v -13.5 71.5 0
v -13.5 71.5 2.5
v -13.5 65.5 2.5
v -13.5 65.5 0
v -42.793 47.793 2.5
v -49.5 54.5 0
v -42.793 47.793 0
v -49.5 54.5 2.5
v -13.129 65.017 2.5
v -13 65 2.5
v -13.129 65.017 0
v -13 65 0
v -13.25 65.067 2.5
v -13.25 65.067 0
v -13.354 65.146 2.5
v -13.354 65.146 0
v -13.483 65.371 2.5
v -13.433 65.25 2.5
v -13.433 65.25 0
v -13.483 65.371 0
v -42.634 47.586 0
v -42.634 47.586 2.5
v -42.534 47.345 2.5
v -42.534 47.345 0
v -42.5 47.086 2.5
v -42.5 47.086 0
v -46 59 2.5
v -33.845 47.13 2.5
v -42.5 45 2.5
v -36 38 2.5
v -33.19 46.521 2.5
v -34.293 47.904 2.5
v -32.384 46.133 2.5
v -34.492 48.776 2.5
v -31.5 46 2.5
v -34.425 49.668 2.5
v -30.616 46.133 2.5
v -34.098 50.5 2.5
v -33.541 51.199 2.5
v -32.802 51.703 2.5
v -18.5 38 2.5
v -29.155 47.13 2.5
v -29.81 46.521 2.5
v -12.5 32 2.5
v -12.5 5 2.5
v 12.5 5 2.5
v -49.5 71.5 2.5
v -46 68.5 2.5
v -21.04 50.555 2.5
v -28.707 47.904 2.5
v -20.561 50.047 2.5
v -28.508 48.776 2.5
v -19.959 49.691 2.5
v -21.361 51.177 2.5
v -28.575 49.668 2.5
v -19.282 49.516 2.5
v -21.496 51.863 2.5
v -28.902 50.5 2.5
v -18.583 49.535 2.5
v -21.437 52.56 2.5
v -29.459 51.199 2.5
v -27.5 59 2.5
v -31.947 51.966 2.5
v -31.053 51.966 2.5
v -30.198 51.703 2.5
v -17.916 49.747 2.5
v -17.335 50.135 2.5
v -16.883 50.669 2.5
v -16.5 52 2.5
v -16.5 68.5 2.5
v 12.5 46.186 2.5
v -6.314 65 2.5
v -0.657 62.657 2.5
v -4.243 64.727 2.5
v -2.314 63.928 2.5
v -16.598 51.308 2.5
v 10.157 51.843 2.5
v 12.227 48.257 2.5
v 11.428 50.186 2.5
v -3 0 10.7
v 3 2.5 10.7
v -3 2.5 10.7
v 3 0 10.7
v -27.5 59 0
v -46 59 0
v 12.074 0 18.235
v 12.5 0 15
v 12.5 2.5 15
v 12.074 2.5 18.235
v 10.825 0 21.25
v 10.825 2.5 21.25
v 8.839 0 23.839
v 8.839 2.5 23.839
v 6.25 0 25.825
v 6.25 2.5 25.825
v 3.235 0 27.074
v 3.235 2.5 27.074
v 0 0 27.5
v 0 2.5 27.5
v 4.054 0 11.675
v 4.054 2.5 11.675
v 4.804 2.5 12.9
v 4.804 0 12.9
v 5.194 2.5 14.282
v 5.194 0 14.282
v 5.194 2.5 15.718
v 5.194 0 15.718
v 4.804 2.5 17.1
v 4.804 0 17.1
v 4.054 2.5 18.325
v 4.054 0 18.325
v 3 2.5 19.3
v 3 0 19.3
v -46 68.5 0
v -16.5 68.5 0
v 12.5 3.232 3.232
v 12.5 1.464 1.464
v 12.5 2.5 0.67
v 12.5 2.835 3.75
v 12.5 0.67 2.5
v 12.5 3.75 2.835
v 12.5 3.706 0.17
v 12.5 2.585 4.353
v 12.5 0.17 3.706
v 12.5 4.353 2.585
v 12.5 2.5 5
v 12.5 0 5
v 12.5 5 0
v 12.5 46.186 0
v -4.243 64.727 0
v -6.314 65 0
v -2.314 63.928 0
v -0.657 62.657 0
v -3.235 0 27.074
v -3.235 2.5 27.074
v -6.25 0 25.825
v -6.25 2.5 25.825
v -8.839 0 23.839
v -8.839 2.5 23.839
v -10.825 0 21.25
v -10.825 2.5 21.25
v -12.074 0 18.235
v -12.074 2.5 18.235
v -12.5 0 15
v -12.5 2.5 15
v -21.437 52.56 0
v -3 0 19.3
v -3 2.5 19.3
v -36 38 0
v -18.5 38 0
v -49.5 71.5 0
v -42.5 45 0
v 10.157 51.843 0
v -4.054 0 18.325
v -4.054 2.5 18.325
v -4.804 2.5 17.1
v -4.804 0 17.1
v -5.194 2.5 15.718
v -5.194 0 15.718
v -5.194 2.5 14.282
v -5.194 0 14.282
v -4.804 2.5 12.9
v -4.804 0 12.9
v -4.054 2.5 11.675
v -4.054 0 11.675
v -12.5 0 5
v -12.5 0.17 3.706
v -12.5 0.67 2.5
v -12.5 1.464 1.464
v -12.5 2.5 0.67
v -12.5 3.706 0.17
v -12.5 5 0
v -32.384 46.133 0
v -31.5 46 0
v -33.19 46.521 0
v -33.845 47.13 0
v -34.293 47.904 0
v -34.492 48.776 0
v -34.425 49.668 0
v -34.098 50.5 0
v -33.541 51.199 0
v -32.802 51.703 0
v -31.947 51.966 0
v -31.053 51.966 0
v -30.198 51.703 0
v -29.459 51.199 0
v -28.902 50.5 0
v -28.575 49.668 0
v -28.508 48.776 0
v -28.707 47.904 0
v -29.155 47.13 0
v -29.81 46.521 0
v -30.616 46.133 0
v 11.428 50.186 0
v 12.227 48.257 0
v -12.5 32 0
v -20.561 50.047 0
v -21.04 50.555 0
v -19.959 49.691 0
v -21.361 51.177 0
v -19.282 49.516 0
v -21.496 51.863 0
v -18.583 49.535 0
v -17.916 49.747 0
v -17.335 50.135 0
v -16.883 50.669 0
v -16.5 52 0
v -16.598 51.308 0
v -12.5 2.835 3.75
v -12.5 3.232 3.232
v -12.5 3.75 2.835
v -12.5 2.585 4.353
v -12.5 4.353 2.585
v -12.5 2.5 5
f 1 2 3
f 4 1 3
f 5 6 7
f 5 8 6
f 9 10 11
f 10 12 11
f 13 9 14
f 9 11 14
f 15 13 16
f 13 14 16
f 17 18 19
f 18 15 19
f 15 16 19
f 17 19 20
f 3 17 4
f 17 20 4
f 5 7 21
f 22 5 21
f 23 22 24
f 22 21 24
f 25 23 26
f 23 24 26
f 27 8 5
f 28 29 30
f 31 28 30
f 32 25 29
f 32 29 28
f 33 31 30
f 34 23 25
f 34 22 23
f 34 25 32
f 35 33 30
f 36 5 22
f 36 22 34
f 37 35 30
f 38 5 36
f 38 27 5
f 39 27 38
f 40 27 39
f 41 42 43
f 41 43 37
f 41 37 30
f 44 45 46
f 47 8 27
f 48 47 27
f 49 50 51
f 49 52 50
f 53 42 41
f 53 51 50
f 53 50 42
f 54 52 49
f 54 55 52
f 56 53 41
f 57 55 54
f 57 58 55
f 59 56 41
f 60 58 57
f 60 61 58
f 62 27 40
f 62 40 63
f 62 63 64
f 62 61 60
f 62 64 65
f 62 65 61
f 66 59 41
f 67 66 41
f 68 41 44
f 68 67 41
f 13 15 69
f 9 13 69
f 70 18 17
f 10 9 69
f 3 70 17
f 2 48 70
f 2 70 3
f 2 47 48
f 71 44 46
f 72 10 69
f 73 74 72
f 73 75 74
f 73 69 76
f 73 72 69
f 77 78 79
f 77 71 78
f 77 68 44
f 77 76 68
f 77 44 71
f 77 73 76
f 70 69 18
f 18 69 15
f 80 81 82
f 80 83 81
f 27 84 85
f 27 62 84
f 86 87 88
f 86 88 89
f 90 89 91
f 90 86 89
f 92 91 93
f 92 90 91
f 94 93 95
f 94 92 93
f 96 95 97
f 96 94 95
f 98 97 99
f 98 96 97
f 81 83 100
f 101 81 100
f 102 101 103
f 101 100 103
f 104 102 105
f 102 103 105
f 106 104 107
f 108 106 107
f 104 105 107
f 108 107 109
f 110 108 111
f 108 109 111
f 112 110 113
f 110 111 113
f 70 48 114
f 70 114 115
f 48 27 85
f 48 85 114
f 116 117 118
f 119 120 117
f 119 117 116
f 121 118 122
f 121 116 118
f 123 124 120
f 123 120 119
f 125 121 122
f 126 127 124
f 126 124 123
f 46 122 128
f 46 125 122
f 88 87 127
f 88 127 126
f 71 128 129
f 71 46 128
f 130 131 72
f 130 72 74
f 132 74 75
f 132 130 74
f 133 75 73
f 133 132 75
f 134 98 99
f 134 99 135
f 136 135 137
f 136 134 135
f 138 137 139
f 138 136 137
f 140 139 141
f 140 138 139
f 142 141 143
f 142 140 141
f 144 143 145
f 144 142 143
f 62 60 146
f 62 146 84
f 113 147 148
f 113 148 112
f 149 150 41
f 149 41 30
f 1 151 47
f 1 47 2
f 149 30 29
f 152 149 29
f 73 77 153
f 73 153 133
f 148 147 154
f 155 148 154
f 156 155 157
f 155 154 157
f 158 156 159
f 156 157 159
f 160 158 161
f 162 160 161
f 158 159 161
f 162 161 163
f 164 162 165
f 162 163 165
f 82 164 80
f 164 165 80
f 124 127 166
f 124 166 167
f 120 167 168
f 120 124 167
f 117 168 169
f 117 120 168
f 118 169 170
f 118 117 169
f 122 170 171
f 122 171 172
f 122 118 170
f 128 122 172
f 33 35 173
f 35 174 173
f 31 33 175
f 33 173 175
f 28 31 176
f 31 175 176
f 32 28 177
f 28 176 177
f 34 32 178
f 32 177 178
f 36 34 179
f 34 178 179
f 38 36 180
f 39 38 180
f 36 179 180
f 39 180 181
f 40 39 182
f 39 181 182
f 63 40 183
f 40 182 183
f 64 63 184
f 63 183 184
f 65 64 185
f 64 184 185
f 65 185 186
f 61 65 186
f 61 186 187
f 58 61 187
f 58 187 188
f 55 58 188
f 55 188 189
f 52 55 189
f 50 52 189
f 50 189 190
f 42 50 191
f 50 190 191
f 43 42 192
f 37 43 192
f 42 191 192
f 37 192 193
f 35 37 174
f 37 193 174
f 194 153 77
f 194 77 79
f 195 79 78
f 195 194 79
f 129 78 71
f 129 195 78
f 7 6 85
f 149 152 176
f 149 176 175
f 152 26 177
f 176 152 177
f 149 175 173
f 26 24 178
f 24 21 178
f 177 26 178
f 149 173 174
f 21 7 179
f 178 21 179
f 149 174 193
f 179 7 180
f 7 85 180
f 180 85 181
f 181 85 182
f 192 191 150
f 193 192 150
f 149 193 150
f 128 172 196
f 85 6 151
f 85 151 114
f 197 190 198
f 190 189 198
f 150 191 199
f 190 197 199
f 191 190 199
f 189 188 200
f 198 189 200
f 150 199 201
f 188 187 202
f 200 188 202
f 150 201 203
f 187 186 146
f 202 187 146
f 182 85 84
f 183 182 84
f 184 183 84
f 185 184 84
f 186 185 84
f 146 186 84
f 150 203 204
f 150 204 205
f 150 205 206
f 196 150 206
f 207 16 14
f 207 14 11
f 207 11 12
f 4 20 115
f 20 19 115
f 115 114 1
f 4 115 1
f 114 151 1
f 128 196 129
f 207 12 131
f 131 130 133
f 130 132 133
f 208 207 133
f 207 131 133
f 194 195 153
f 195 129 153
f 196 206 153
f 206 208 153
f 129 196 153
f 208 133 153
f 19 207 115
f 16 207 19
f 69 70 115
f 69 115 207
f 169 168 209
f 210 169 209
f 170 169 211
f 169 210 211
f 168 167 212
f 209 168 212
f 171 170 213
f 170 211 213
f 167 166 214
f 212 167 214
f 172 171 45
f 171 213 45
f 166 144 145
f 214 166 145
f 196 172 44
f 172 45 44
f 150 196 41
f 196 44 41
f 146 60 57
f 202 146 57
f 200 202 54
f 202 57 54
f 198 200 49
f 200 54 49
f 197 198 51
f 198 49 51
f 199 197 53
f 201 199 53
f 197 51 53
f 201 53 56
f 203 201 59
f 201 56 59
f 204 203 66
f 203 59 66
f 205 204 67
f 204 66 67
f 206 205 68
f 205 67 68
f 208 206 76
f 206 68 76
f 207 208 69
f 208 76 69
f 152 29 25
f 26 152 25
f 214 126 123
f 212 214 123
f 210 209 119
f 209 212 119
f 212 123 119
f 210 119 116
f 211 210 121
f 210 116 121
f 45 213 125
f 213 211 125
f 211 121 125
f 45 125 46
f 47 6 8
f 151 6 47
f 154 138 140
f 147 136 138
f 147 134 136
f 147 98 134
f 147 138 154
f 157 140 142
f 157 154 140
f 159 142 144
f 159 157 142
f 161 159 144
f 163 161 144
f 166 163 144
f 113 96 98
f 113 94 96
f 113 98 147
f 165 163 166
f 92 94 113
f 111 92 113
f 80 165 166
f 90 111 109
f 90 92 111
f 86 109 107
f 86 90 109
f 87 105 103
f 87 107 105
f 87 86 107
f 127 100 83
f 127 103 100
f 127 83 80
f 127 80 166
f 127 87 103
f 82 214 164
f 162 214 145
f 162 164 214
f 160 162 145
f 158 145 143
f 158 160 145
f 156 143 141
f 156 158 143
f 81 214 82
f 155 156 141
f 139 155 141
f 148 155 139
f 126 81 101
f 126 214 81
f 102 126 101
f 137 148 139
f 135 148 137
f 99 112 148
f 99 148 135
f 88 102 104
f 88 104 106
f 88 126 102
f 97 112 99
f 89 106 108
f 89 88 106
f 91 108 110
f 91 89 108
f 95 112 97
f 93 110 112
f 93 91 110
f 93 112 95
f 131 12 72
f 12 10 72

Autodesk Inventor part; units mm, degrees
ref_plane "YZ Plane" through (0, 0, 0) normal (1, 0, 0) x (0, 1, 0)
ref_plane "XZ Plane" through (0, 0, 0) normal (0, 1, 0) x (-1, 0, 0)
ref_plane "XY Plane" through (0, 0, 0) normal (0, 0, 1) x (1, 0, 0)
sketch "Sketch1" plane through (0, 0, 0) normal (0, 0, 1) x (1, 0, 0)
  line L0 (-12.5, 71.5) -> (12.5, 71.5)
  line L1 (12.5, 71.5) -> (12.5, 0)
  line L2 (12.5, 0) -> (-12.5, 0)
  line L3 (-12.5, 0) -> (-12.5, 71.5)
  line L4 (-49.5, 71.5) -> (12.5, 71.5)
  line L5 (12.5, 71.5) -> (12.5, 38)
  line L6 (12.5, 38) -> (-49.5, 38)
  line L7 (-49.5, 38) -> (-49.5, 71.5)
  point P0 (0, 0)
  point P1 (0, 0)
  dimension "d0" = 25
  dimension "d1" = 71.5
  dimension "d2" = 62
  dimension "d3" = 33.5
extrude "Plate1" add sketch "Sketch1" along normal blind 2.5
sketch "Sketch2" plane through (12.5, 2.5, 0) normal (0, -1, 0) x (1, 0, 0)
  line L0 (-25, 0) -> (0, 0)
  line L1 (0, 0) -> (0, 27.5)
  line L2 (0, 27.5) -> (-25, 27.5)
  line L3 (-25, 27.5) -> (-25, 0)
edge flange "Flange1" height 27.5 angle 90 thickness 2.5 bend radius 2.5 thickness toward (0, -1, 0) relief tear relief width 2.5 relief depth 1.25 edges at (0, 0, 2.5) wall of the first edge with corners at (-12.5, 2.5, 0) (12.5, 2.5, 0) (12.5, 2.5, 27.5) (-12.5, 2.5, 27.5)
bend "Bend1"
corner "Corner1"
fillet "Fillet1" radius 12.5 1 edges at (-12.5, 1.25, 27.5)
fillet "Fillet2" radius 12.5 1 edges at (12.5, 1.25, 27.5)
sketch "Sketch5" plane through (-12.5, 0, 5) normal (0, -1, 0) x (1, 0, 0)
  line L0 (9.5, 14.3) -> (15.5, 14.3)
  line L1 (15.5, 14.3) -> (15.5, 5.7)
  line L2 (15.5, 5.7) -> (9.5, 5.7)
  line L3 (9.5, 5.7) -> (9.5, 14.3)
  arc A0 (25, 10) -> (0, 10) centre (12.5, 10) ccw projected
  arc A1 (9.5, 14.3) -> (9.5, 5.7) centre (12.5, 10) ccw
  arc A2 (15.5, 5.7) -> (15.5, 14.3) centre (12.5, 10) ccw
  line L4 (9.5, 5.7) -> (9.5, 14.3)
  line L5 (15.5, 5.7) -> (15.5, 14.3)
  point P0 (12.5, -5)
  point P1 (12.5, 14.3)
  point P2 (12.5, 22.5)
  dimension "d20" = 8.6
  dimension "d21" = 6
extrude "Cut1" cut sketch "Sketch5" against normal blind 2.5
sketch "Sketch6" plane through (0, 0, 2.5) normal (0, 0, 1) x (1, 0, 0)
  line L0 (12.5, 71.5) -> (-49.5, 71.5) projected
  line L1 (12.5, 71.5) -> (-13.5, 71.5)
  line L2 (-13.5, 71.5) -> (-13.5, 65)
  line L3 (-13.5, 65) -> (12.5, 65)
  line L4 (12.5, 65) -> (12.5, 71.5)
  line L5 (-3, 65) -> (12.5, 65)
  line L6 (12.5, 65) -> (12.5, 49.5)
  line L7 (12.5, 49.5) -> (-3, 65)
  point P0 (0, 0)
  dimension "d24" = 26
  dimension "d25" = 6.5
  dimension "d26" = 15.5
  dimension "d27" = 15.5
extrude "Cut2" cut sketch "Sketch6" against normal blind 2.5
fillet "Fillet3" radius 0.5 1 edges at (-13.5, 65, 1.25)
fillet "Fillet4" radius 8 2 edges at (-3, 65, 1.25) (12.5, 49.5, 1.25)
sketch "Sketch7" plane through (0, 0, 2.5) normal (0, 0, 1) x (1, 0, 0)
  line L0 (-12.5, 38) -> (-49.5, 38)
  line L1 (-12.5, 38) -> (-18.5, 38)
  line L2 (-12.5, 38) -> (-12.5, 32)
  line L3 (-12.5, 5) -> (-12.5, 38)
  line L4 (-12.5, 32) -> (-18.5, 38)
  point P0 (0, 0)
  dimension "d32" = 6
  dimension "d33" = 6
sheet face with bend "Face2" sketch "Sketch7" thickness 2.5 toward (0, 0, -1) bend radius 2.5
bend "Bend2"
sketch "Sketch8" plane through (0, 0, 2.5) normal (0, 0, 1) x (1, 0, 0)
  line L0 (-49.5, 71.5) -> (-49.5, 38) projected
  line L1 (-49.5, 38) -> (-36, 38)
  line L2 (-18.5, 38) -> (-49.5, 38) projected
  line L3 (-49.5, 38) -> (-49.5, 54.5)
  line L4 (-49.5, 54.5) -> (-43, 54.5)
  line L5 (-49.5, 54.5) -> (-49.5, 47.5)
  line L6 (-49.5, 54.5) -> (-42.5, 47.5)
  line L7 (-36, 38) -> (-42.5, 38)
  line L8 (-36, 38) -> (-36, 45)
  line L9 (-36, 38) -> (-42.5, 45)
  line L10 (-42.5, 45) -> (-42.5, 47.5)
  point P0 (0, 0)
  dimension "d39" = 13.5
  dimension "d40" = 16.5
  dimension "d41" = 6.5
  dimension "d42" = 7
  dimension "d43" = 6.5
  dimension "d44" = 7
extrude "Cut3" cut sketch "Sketch8" against normal blind 2.5
fillet "Fillet5" radius 1 1 edges at (-42.5, 47.5, 1.25)
sketch "Sketch9" plane through (0, 0, 2.5) normal (0, 0, 1) x (1, 0, 0)
  line L0 (-49.5, 71.5) -> (-13.5, 71.5) projected
  line L1 (-49.5, 54.5) -> (-49.5, 71.5) projected
  point P0 (0, 0)
  point P1 (-31.5, 49)
  dimension "d48" = 22.5
  dimension "d49" = 18
hole "Hole1" at (-31.5, 49, 2.5) direction (0, 0, -1) diameter 6 end through all
sketch "Sketch10" plane through (0, 0, 2.5) normal (0, 0, 1) x (1, 0, 0)
  line L0 (-46, 68.5) -> (-16.5, 68.5)
  line L1 (-16.5, 68.5) -> (-16.5, 59)
  line L2 (-16.5, 59) -> (-46, 59)
  line L3 (-46, 59) -> (-46, 68.5)
  line L4 (-49.5, 54.5) -> (-49.5, 71.5) projected
  line L5 (-16.5, 59) -> (-27.5, 59)
  line L6 (-16.5, 59) -> (-16.5, 52)
  circle A0 centre (-19, 52) radius 2.5
  line L7 (-49.5, 71.5) -> (-13.5, 71.5) projected
  line L8 (-21.4366, 52.5597) -> (-27.5, 59)
  point P0 (0, 0)
  dimension "d57" = 29.5
  dimension "d58" = 9.5
  dimension "d59" = 3.5
  dimension "d60" = 3
  dimension "d61" = 11
  dimension "d63" = 5
  dimension "d64" = 19.5
  dimension "d65" = 30.5
extrude "Cut4" cut sketch "Sketch10" against normal blind 2.5
equation "\"d22\" = Thickness"
equation "\"d28\" = Thickness"
equation "\"d45\" = Thickness"
equation "\"d55\" = Thickness"
equation "\"d66\" = Thickness"
equation "\"d68\" = Thickness"
equation "\"d5\" = BendReliefWidth"
equation "\"d6\" = BendReliefDepth"
equation "\"d7\" = MinimumRemnant"
equation "\"d8\" = BendRadius"
equation "\"d11\" = BendRadius"
equation "\"d12\" = CornerReliefSize"
equation "\"d13\" = GapSize"
equation "\"d14\" = JacobiRadiusSize"
equation "\"d34\" = BendRadius"
equation "\"d35\" = BendReliefWidth"
equation "\"d37\" = MinimumRemnant"
equation "\"d36\" = BendReliefDepth"
equation "\"d38\" = BendRadius"
equation "\"BendRadius\" = Thickness"
equation "\"BendReliefWidth\" = Thickness"
equation "\"BendReliefDepth\" = 0.5 * Thickness"
equation "\"MinimumRemnant\" = 2 * Thickness"
equation "\"TransitionRadius\" = BendRadius"
equation "\"JacobiRadiusSize\" = BendRadius"
equation "\"GapSize\" = Thickness"
equation "\"d4\" = BendRadius"
equation "\"Thickness\" = 2.5"
equation "\"CornerReliefSize\" = 10"
properties part number "Luxcan P2"
